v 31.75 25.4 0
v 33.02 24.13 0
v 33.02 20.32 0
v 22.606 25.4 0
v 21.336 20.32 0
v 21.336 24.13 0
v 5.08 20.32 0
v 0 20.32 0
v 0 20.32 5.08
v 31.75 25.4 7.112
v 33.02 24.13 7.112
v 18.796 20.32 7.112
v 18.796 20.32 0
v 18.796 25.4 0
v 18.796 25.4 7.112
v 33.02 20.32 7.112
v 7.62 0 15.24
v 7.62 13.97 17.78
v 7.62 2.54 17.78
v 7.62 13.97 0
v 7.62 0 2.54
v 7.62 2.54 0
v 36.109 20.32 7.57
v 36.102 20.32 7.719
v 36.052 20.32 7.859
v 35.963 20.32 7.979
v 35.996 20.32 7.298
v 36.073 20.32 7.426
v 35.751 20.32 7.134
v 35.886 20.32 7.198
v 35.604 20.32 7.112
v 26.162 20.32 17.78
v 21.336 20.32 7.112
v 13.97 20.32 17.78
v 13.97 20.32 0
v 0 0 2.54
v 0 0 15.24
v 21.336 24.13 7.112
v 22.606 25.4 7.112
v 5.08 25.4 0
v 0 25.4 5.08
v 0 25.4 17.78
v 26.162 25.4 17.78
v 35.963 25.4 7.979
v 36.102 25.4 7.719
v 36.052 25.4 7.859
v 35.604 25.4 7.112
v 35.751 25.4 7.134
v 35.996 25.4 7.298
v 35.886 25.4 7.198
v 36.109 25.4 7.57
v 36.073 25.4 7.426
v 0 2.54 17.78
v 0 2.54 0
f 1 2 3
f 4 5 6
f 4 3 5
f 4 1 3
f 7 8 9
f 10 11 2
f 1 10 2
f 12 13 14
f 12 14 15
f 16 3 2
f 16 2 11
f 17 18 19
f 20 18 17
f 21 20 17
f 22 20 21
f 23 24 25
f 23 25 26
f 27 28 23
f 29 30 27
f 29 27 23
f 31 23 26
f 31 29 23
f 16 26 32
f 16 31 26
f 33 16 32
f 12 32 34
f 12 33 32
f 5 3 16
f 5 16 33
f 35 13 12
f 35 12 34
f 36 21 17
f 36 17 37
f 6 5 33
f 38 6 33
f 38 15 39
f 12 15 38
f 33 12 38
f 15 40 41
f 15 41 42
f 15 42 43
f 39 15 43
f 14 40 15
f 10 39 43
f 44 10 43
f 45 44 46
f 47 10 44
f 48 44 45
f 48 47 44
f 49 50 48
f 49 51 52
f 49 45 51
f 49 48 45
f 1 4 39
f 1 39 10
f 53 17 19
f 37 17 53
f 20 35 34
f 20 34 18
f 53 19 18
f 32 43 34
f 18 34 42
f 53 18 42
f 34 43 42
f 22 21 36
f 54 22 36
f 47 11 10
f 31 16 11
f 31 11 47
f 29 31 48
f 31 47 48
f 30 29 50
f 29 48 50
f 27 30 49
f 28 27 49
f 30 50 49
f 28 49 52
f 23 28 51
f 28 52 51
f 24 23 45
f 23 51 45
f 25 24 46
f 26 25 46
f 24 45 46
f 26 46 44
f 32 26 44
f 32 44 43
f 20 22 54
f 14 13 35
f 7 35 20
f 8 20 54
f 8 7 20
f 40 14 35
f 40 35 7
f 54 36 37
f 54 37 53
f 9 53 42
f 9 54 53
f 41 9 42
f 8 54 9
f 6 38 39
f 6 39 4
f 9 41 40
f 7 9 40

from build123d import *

# Parameters (mm, degrees)
BOSS_EXTRUDE1_DEPTH = 17.78
SKETCH4_W           = 2.54
SKETCH4_H           = 7.112
CUT_EXTRUDE2_DEPTH  = 6.08
CUT_EXTRUDE1_DEPTH  = 5.08
CHAMFER3_SIZE       = 2.54
FILLET2_R           = 0.508
CHAMFER4_SIZE       = 1.27


with BuildPart() as part:
    # Sketch1 → Boss-Extrude1 (new body)
    with BuildSketch(Plane.XY):
        Polygon((0, 0), (0, 25.4), (43.18, 25.4), (43.18, 20.32), (13.97, 20.32), (7.62, 13.97), (7.62, 0), align=None)
    extrude(amount=BOSS_EXTRUDE1_DEPTH)

    # Sketch4 → Cut-Extrude2 (cut, through all)
    with BuildSketch(Plane.XZ.offset(-20.32)):
        with Locations((20.066, 3.556)):
            Rectangle(SKETCH4_W, SKETCH4_H)
        Polygon((33.02, 0), (33.02, 7.112), (36.83, 7.112), (26.162, 17.78), (43.18, 17.78), (43.18, 0), align=None)
    extrude(amount=-CUT_EXTRUDE2_DEPTH, mode=Mode.SUBTRACT)

    # Sketch3 → Cut-Extrude1 (cut)
    with BuildSketch(Plane(origin=(0, 25.4, 0), x_dir=(1, 0, 0), z_dir=(0, 1, 0))):
        Polygon((0, 0), (0, -5.08), (5.08, 0), align=None)
    extrude(amount=-CUT_EXTRUDE1_DEPTH, mode=Mode.SUBTRACT)

    # Chamfer3
    chamfer3_edges = [part.edges().sort_by_distance(p)[0] for p in [
        (3.81, 0, 0),
        (3.81, 0, 17.78),
    ]]
    chamfer(chamfer3_edges, length=CHAMFER3_SIZE)

    # Fillet2
    fillet2_edges = [part.edges().sort_by_distance(p)[0] for p in [
        (36.83, 22.86, 7.112),
    ]]
    fillet(fillet2_edges, radius=FILLET2_R)

    # Chamfer4
    chamfer4_edges = [part.edges().sort_by_distance(p)[0] for p in [
        (21.336, 25.4, 3.556),
        (33.02, 25.4, 3.556),
    ]]
    chamfer(chamfer4_edges, length=CHAMFER4_SIZE)


solid = part.part
